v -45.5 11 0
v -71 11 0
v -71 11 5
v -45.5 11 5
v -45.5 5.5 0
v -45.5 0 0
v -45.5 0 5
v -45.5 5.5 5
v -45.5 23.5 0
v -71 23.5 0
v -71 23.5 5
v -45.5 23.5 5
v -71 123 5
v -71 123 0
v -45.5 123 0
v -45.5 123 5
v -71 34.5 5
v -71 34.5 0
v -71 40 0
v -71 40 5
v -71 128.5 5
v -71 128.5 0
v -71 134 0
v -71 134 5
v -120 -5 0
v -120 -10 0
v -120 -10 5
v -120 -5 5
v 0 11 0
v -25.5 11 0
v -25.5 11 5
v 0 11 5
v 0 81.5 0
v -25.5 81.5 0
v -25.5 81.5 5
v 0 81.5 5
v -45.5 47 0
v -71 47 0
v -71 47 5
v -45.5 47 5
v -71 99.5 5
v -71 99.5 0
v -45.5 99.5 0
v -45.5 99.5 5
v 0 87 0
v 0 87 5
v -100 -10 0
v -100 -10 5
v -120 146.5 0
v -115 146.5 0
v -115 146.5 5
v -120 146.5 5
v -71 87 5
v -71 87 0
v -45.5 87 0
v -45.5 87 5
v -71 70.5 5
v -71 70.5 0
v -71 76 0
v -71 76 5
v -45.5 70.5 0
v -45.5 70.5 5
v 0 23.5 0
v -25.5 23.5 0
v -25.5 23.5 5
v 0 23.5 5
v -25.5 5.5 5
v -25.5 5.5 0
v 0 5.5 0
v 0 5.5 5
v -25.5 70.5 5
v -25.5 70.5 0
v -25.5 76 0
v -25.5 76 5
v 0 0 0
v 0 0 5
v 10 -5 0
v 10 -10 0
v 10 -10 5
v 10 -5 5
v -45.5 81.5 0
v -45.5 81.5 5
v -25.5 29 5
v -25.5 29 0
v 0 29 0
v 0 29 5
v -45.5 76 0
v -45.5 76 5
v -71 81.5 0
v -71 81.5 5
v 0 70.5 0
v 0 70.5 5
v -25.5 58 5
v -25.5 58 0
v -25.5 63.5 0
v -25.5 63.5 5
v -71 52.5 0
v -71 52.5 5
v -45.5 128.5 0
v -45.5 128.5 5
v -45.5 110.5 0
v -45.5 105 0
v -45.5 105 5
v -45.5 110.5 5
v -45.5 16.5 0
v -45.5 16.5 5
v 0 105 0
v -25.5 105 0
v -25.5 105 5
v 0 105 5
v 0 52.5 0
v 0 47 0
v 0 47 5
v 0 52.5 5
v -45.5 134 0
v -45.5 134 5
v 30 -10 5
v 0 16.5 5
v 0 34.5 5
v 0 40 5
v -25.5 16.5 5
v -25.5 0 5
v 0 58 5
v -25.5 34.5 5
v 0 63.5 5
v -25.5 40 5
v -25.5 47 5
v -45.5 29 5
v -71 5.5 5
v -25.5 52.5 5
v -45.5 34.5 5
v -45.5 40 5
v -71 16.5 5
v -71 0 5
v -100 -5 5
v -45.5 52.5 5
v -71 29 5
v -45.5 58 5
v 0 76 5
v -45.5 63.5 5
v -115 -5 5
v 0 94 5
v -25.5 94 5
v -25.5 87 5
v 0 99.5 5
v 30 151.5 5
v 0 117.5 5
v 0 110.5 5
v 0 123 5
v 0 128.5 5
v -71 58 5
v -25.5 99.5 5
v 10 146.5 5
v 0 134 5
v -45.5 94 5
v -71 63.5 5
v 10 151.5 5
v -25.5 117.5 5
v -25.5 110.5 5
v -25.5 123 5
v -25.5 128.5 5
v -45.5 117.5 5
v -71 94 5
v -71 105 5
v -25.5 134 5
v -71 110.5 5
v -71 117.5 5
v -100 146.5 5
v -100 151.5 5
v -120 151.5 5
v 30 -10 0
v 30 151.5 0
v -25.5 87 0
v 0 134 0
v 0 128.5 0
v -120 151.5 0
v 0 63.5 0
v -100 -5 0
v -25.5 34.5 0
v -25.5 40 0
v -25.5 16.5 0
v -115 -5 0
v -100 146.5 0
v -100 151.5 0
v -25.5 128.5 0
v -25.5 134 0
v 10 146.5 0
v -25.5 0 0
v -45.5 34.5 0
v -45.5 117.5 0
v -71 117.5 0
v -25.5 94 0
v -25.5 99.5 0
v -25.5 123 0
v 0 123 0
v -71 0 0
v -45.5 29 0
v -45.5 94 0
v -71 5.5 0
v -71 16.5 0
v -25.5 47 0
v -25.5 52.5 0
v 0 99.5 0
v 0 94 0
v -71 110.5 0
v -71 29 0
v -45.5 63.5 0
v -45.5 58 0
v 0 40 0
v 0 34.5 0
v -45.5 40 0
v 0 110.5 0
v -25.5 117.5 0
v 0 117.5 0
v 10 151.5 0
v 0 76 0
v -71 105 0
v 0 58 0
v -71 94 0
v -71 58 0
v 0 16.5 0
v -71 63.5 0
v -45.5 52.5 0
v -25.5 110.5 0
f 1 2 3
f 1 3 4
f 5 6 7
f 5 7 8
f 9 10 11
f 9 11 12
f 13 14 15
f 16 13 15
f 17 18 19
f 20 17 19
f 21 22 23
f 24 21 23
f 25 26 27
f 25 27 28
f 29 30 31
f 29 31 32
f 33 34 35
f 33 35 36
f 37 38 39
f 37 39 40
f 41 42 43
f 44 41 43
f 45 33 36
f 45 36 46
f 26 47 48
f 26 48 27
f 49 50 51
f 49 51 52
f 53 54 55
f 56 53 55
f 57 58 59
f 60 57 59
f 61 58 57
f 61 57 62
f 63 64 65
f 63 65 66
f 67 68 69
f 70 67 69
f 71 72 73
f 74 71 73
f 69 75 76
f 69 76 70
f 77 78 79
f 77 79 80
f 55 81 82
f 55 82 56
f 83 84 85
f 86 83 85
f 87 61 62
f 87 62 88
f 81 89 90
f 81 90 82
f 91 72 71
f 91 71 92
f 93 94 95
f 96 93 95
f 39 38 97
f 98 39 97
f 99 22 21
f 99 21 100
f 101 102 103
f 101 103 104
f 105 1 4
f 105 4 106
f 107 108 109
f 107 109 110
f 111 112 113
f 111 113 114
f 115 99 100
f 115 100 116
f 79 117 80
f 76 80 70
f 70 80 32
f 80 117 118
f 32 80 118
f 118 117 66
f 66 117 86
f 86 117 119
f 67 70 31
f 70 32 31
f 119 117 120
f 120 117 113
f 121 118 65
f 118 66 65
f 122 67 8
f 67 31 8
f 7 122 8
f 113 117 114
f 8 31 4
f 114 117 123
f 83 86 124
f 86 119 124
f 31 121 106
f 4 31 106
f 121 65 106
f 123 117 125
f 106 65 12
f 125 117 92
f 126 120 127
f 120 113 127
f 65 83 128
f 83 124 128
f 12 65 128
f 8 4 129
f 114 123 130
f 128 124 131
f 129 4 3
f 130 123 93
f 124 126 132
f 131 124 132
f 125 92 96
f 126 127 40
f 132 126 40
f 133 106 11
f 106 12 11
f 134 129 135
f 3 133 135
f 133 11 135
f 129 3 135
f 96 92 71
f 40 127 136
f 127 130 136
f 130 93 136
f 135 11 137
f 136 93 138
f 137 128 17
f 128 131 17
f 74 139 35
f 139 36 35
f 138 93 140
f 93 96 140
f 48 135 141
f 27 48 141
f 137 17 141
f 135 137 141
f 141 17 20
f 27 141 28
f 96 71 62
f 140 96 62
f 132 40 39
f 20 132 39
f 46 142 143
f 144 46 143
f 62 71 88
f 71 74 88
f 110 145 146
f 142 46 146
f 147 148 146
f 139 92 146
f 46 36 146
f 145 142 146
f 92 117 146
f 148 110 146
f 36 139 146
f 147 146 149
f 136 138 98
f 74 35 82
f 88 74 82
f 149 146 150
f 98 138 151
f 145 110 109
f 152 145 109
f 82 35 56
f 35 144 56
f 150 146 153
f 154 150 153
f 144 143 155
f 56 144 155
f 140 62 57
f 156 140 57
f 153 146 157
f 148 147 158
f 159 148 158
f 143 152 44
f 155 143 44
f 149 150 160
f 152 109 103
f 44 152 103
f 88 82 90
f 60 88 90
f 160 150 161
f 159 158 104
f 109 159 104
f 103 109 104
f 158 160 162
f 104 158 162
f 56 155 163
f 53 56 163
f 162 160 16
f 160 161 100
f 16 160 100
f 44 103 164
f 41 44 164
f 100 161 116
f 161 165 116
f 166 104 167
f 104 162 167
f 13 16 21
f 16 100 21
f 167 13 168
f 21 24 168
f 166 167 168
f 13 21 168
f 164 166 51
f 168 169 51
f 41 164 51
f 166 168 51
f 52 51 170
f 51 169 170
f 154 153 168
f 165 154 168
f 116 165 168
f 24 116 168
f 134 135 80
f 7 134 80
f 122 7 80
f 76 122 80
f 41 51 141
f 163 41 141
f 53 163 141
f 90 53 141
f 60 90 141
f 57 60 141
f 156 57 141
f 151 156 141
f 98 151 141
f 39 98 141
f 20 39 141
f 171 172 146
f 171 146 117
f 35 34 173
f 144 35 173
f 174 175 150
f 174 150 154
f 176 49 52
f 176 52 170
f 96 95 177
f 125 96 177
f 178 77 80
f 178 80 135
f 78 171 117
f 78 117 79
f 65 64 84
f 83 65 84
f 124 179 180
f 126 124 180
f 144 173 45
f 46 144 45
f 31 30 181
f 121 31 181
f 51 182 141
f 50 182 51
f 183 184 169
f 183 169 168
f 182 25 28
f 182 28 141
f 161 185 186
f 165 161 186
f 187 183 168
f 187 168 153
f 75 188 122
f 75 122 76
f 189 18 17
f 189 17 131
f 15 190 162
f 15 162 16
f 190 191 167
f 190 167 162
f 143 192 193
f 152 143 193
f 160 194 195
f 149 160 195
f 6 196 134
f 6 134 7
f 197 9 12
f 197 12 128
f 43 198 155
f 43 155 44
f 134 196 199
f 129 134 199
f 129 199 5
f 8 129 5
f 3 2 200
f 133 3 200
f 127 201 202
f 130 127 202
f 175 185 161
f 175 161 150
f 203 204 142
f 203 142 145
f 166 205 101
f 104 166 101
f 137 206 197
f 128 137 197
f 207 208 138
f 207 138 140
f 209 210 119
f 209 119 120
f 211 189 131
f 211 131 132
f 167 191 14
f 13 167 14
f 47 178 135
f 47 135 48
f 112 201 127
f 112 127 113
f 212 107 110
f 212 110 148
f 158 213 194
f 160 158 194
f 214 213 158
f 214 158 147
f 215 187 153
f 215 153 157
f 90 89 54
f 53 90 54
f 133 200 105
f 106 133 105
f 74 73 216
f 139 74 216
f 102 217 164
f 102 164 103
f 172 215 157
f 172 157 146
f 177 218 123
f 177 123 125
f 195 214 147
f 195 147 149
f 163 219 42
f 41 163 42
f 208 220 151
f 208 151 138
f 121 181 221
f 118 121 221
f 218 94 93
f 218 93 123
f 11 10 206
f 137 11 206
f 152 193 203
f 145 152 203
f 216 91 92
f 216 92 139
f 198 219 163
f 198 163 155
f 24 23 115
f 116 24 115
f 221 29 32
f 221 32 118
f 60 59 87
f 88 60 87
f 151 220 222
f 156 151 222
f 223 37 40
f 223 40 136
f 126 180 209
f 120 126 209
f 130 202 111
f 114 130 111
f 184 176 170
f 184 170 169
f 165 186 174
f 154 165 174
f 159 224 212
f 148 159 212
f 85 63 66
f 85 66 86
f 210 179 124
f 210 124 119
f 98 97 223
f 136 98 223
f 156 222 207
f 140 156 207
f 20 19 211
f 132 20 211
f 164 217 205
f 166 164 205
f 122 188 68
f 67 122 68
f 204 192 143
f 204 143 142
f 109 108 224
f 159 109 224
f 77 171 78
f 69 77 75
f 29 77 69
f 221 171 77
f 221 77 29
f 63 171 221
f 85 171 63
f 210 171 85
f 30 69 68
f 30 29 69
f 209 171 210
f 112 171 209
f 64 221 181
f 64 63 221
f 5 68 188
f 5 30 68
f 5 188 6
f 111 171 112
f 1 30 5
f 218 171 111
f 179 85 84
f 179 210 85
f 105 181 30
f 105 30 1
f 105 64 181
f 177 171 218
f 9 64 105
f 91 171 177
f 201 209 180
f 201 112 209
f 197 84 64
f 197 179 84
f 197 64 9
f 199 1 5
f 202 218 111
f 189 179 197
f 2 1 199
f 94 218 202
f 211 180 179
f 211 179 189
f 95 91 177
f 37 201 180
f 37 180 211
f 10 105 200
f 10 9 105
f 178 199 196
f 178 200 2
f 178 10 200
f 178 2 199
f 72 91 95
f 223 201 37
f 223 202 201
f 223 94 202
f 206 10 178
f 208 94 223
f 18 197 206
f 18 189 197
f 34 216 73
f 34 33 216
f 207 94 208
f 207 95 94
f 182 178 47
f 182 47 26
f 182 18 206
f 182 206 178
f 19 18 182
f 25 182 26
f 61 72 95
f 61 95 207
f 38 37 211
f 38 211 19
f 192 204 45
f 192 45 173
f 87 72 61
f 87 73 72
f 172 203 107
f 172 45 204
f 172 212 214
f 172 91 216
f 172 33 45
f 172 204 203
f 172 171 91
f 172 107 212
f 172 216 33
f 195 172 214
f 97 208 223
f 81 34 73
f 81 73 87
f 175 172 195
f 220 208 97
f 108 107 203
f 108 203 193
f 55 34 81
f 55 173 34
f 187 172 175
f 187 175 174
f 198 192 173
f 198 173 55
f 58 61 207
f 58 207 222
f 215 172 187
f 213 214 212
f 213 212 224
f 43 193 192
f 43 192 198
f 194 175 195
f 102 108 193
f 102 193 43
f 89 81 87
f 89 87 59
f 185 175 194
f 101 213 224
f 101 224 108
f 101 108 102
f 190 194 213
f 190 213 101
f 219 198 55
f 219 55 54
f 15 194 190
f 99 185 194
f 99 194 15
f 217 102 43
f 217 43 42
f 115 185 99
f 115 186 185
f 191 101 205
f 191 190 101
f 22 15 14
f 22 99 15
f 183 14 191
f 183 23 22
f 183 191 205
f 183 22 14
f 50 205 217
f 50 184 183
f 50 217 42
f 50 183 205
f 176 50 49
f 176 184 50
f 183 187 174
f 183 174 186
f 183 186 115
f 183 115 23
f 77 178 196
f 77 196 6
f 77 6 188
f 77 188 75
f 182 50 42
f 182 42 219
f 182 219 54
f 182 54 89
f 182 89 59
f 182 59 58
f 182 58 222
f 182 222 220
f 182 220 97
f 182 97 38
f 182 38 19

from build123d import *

# Parameters (mm, degrees)
SKETCH1_W           = 25.5
SKETCH1_H           = 5.5
BOSS_EXTRUDE1_DEPTH = 5


with BuildPart() as part:
    # Sketch1 → Boss-Extrude1 (new body)
    with BuildSketch(Plane.XY):
        Polygon((-100, 151.5), (-100, 146.5), (10, 146.5), (10, 151.5), (30, 151.5), (30, -10), (10, -10), (10, -5), (-100, -5), (-100, -10), (-120, -10), (-120, -5), (-115, -5), (-115, 146.5), (-120, 146.5), (-120, 151.5), align=None)
        with Locations((-58.25, 13.75)):
            Rectangle(SKETCH1_W, SKETCH1_H, mode=Mode.SUBTRACT)
        with Locations((-12.75, 2.75)):
            Rectangle(SKETCH1_W, SKETCH1_H, mode=Mode.SUBTRACT)
        with Locations((-58.25, 2.75)):
            Rectangle(SKETCH1_W, SKETCH1_H, mode=Mode.SUBTRACT)
        with Locations((-12.75, 13.75)):
            Rectangle(SKETCH1_W, SKETCH1_H, mode=Mode.SUBTRACT)
        with Locations((-12.75, 26.25)):
            Rectangle(SKETCH1_W, SKETCH1_H, mode=Mode.SUBTRACT)
        with Locations((-58.25, 26.25)):
            Rectangle(SKETCH1_W, SKETCH1_H, mode=Mode.SUBTRACT)
        with Locations((-58.25, 37.25)):
            Rectangle(SKETCH1_W, SKETCH1_H, mode=Mode.SUBTRACT)
        with Locations((-12.75, 37.25)):
            Rectangle(SKETCH1_W, SKETCH1_H, mode=Mode.SUBTRACT)
        with Locations((-12.75, 49.75)):
            Rectangle(SKETCH1_W, SKETCH1_H, mode=Mode.SUBTRACT)
        with Locations((-58.25, 49.75)):
            Rectangle(SKETCH1_W, SKETCH1_H, mode=Mode.SUBTRACT)
        with Locations((-58.25, 60.75)):
            Rectangle(SKETCH1_W, SKETCH1_H, mode=Mode.SUBTRACT)
        with Locations((-12.75, 60.75)):
            Rectangle(SKETCH1_W, SKETCH1_H, mode=Mode.SUBTRACT)
        with Locations((-12.75, 73.25)):
            Rectangle(SKETCH1_W, SKETCH1_H, mode=Mode.SUBTRACT)
        with Locations((-58.25, 73.25)):
            Rectangle(SKETCH1_W, SKETCH1_H, mode=Mode.SUBTRACT)
        with Locations((-58.25, 84.25)):
            Rectangle(SKETCH1_W, SKETCH1_H, mode=Mode.SUBTRACT)
        with Locations((-12.75, 84.25)):
            Rectangle(SKETCH1_W, SKETCH1_H, mode=Mode.SUBTRACT)
        with Locations((-12.75, 96.75)):
            Rectangle(SKETCH1_W, SKETCH1_H, mode=Mode.SUBTRACT)
        with Locations((-58.25, 96.75)):
            Rectangle(SKETCH1_W, SKETCH1_H, mode=Mode.SUBTRACT)
        with Locations((-58.25, 107.75)):
            Rectangle(SKETCH1_W, SKETCH1_H, mode=Mode.SUBTRACT)
        with Locations((-12.75, 107.75)):
            Rectangle(SKETCH1_W, SKETCH1_H, mode=Mode.SUBTRACT)
        with Locations((-12.75, 120.25)):
            Rectangle(SKETCH1_W, SKETCH1_H, mode=Mode.SUBTRACT)
        with Locations((-58.25, 120.25)):
            Rectangle(SKETCH1_W, SKETCH1_H, mode=Mode.SUBTRACT)
        with Locations((-58.25, 131.25)):
            Rectangle(SKETCH1_W, SKETCH1_H, mode=Mode.SUBTRACT)
        with Locations((-12.75, 131.25)):
            Rectangle(SKETCH1_W, SKETCH1_H, mode=Mode.SUBTRACT)
    extrude(amount=BOSS_EXTRUDE1_DEPTH)


solid = part.part
